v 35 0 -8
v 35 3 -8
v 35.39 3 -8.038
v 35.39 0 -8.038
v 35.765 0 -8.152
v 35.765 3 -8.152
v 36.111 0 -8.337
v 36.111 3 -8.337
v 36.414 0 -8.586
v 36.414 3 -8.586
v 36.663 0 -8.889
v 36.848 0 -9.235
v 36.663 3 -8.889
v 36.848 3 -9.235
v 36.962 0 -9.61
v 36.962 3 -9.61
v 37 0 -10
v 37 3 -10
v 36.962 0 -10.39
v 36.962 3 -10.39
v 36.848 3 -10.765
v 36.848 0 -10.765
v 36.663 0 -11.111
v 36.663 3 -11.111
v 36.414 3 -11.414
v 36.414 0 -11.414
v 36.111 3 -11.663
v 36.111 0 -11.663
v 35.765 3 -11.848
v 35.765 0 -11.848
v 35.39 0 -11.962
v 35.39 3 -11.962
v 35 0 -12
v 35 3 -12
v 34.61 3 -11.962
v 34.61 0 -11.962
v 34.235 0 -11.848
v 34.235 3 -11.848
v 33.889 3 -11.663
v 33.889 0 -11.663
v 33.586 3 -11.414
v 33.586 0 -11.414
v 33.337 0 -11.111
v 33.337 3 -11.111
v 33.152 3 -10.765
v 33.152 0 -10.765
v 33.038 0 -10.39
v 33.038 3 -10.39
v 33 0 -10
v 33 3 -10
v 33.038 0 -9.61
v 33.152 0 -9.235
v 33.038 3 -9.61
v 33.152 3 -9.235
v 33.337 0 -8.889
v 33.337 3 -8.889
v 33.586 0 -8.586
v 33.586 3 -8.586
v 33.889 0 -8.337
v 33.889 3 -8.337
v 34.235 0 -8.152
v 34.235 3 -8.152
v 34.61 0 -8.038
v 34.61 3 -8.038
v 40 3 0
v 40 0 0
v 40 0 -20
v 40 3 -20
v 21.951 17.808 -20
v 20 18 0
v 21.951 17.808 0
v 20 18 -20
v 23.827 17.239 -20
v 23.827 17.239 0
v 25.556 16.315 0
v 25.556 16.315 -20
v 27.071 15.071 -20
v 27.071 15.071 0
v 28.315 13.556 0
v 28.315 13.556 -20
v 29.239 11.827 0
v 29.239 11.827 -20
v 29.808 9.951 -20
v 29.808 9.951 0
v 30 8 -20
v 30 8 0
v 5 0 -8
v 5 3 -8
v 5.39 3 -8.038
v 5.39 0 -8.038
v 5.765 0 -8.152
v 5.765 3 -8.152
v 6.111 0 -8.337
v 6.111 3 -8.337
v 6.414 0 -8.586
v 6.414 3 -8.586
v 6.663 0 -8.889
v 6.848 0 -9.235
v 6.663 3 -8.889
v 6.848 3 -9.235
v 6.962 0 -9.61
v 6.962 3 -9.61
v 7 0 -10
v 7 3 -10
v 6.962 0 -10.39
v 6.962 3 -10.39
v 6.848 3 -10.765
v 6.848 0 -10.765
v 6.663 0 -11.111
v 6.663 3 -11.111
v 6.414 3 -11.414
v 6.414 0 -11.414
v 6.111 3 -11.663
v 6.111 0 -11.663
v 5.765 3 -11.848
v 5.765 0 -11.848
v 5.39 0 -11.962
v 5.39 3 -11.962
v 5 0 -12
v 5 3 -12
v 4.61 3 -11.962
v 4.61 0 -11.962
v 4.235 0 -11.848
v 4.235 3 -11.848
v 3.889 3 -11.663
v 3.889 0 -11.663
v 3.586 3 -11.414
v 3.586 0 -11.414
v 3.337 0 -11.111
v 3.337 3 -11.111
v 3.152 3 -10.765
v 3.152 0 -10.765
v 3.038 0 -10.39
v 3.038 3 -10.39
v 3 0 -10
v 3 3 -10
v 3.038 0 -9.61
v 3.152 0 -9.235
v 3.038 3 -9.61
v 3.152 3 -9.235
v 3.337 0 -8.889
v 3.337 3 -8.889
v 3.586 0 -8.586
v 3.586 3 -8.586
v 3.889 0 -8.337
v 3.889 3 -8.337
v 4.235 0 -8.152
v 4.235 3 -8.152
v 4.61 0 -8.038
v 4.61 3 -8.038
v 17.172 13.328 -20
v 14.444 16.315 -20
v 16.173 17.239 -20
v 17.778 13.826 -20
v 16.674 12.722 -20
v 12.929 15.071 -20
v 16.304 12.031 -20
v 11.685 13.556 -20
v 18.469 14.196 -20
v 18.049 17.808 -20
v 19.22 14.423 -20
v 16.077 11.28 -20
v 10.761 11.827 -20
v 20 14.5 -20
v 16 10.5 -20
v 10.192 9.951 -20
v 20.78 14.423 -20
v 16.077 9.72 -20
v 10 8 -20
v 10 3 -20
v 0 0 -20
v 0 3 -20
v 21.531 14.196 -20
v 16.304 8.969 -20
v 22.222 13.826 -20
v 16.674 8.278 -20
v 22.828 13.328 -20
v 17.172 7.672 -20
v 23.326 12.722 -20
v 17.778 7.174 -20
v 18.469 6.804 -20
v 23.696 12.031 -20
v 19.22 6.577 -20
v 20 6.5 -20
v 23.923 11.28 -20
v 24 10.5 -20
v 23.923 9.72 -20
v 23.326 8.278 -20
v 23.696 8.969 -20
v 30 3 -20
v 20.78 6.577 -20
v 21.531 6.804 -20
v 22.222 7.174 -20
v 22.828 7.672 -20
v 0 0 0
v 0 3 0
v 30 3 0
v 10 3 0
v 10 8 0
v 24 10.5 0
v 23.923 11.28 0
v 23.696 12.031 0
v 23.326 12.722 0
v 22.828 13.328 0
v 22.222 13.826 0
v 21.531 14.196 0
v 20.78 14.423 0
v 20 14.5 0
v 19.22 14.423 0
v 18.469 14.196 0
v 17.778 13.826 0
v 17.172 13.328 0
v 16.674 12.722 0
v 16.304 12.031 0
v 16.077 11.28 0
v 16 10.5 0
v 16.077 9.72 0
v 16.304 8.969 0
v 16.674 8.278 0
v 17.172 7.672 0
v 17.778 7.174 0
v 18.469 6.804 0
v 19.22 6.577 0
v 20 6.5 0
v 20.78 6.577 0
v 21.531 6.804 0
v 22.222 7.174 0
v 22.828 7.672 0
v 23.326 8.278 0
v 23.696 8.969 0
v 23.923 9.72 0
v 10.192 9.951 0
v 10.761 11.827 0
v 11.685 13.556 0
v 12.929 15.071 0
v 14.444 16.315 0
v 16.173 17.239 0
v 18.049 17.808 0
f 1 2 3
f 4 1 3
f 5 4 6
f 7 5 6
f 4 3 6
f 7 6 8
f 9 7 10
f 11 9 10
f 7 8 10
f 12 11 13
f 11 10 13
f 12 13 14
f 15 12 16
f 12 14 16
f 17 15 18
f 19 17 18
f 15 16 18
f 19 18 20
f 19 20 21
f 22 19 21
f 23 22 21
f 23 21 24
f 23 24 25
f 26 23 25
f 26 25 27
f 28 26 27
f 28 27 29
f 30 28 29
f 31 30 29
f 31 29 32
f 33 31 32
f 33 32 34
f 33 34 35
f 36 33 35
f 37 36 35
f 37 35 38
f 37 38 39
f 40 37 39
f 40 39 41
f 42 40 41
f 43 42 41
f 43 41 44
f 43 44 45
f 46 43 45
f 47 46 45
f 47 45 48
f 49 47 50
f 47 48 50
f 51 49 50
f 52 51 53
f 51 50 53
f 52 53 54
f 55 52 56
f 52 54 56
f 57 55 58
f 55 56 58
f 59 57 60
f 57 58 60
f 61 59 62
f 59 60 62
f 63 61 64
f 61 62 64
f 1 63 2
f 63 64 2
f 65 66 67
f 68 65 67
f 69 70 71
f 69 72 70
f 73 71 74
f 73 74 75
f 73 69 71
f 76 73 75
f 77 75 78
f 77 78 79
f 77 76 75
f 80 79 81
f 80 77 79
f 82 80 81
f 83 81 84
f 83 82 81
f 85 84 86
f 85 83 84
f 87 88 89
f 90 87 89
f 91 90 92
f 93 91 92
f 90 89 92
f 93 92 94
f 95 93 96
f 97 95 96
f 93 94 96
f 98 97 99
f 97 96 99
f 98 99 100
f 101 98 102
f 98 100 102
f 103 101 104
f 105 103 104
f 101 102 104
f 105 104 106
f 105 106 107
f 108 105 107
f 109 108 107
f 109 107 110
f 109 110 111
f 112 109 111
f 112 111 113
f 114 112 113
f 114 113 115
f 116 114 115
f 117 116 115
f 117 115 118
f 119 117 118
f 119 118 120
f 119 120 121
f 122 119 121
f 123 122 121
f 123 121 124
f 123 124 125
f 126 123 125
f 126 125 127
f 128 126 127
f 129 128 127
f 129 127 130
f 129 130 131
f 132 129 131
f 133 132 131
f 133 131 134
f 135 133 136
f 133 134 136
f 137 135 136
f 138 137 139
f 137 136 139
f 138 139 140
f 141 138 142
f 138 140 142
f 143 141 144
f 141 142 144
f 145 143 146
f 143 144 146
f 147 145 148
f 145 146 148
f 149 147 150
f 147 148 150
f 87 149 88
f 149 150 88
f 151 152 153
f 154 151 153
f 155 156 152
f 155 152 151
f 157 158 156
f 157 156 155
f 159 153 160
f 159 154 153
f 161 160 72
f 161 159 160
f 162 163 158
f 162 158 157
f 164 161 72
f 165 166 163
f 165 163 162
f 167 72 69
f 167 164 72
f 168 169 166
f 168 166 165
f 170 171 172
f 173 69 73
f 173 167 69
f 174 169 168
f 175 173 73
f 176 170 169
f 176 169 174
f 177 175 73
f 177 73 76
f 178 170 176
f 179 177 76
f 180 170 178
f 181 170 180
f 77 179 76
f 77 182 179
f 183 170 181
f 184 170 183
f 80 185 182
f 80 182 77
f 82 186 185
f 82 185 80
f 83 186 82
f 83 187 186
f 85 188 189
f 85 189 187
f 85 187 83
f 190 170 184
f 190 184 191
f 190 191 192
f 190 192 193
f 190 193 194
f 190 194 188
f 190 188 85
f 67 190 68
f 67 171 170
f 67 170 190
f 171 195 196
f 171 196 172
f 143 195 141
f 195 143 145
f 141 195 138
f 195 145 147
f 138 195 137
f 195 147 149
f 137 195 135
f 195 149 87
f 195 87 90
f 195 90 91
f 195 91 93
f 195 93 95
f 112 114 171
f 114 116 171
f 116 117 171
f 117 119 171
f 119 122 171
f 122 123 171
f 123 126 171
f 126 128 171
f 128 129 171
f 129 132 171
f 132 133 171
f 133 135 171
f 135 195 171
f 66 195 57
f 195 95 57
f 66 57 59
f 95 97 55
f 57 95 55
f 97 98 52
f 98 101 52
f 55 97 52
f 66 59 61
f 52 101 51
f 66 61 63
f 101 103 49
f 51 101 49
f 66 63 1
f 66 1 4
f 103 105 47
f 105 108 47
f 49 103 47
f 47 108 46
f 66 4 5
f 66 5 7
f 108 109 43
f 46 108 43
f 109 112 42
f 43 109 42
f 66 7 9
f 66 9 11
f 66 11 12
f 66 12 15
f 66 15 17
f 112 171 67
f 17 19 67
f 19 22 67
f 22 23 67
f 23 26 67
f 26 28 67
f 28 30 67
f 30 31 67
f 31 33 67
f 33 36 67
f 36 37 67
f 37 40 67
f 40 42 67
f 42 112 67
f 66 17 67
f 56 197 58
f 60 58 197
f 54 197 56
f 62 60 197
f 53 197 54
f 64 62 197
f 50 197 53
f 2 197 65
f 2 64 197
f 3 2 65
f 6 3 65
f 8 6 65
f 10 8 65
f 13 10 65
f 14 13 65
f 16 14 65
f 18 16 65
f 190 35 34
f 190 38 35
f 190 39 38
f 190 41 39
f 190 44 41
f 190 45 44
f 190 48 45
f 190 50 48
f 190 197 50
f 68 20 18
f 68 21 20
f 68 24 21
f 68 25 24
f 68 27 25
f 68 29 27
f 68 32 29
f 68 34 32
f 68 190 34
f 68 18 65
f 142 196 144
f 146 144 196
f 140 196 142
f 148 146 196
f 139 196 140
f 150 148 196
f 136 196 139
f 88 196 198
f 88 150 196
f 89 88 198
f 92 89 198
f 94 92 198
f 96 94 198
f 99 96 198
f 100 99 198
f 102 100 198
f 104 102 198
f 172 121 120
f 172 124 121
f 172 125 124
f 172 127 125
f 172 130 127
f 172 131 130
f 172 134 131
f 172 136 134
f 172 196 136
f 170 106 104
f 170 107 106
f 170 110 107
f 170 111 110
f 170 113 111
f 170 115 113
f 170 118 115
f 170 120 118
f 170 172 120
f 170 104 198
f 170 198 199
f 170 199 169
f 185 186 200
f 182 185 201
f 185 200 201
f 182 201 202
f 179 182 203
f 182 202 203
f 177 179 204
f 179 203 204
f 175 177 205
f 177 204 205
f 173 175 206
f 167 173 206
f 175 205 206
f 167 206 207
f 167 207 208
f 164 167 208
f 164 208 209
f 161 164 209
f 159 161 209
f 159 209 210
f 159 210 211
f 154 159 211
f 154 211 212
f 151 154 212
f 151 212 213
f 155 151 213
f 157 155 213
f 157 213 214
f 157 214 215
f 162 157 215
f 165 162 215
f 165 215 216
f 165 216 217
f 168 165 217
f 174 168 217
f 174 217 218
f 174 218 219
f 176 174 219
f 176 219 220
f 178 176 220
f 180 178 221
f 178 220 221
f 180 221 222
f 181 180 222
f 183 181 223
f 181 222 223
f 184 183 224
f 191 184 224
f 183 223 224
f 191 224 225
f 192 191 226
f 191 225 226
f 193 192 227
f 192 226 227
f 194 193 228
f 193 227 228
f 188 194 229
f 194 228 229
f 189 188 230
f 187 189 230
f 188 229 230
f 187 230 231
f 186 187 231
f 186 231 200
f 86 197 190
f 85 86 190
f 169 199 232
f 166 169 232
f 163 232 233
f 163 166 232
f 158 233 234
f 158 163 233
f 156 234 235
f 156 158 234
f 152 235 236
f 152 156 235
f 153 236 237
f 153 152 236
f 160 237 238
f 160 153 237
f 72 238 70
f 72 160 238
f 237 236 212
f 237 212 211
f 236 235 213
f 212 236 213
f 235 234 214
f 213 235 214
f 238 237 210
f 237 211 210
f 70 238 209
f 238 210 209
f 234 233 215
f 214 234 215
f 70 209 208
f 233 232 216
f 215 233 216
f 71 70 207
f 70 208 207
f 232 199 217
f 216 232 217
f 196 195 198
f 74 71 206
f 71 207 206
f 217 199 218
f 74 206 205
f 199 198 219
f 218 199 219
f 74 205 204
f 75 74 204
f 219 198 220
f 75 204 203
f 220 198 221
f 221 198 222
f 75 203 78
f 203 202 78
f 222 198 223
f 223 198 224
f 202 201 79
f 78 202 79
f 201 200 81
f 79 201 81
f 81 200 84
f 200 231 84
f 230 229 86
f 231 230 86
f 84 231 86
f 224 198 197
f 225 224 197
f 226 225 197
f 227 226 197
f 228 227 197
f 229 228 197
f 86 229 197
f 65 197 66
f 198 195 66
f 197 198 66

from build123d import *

# Parameters (mm, degrees)
SKETCH1_W           = 40
SKETCH1_H           = 20
BOSS_EXTRUDE1_DEPTH = 3
SKETCH2_W           = 20
SKETCH2_H           = 20
BOSS_EXTRUDE2_DEPTH = 15
SKETCH3_R           = 4
CUT_EXTRUDE1_DEPTH  = 49.207883173
FILLET1_R           = 10
SKETCH4_R           = 2
CUT_EXTRUDE2_DEPTH  = 48.16990566


with BuildPart() as part:
    # Sketch1 → Boss-Extrude1 (new body)
    with BuildSketch(Plane(origin=(0, 0, 0), x_dir=(1, 0, 0), z_dir=(0, 1, 0))):
        with Locations((20, 10)):
            Rectangle(SKETCH1_W, SKETCH1_H)
    extrude(amount=BOSS_EXTRUDE1_DEPTH)

    # Sketch2 → Boss-Extrude2 (add)
    with BuildSketch(Plane(origin=(0, 3, 0), x_dir=(1, 0, 0), z_dir=(0, 1, 0))):
        with Locations((20, 10)):
            Rectangle(SKETCH2_W, SKETCH2_H)
    extrude(amount=BOSS_EXTRUDE2_DEPTH)

    # Sketch3 → Cut-Extrude1 (cut, through all)
    with BuildSketch(Plane.XY):
        with Locations((20, 10.5)):
            Circle(SKETCH3_R)
    extrude(amount=-CUT_EXTRUDE1_DEPTH, mode=Mode.SUBTRACT)

    # Fillet1
    fillet1_edges = [part.edges().sort_by_distance(p)[0] for p in [
        (30, 18, -10),
        (10, 18, -10),
    ]]
    fillet(fillet1_edges, radius=FILLET1_R - 0.0001)  # a hair under: the kernel refuses the full size

    # Sketch4 → Cut-Extrude2 (cut, through all)
    with BuildSketch(Plane(origin=(0, 3, 0), x_dir=(1, 0, 0), z_dir=(0, 1, 0))):
        with Locations(Location((35, 10, 0), (0, 0, 270))):
            Circle(SKETCH4_R)
        with Locations(Location((5, 10, 0), (0, 0, 270))):
            Circle(SKETCH4_R)
    extrude(amount=-CUT_EXTRUDE2_DEPTH, mode=Mode.SUBTRACT)


solid = part.part
